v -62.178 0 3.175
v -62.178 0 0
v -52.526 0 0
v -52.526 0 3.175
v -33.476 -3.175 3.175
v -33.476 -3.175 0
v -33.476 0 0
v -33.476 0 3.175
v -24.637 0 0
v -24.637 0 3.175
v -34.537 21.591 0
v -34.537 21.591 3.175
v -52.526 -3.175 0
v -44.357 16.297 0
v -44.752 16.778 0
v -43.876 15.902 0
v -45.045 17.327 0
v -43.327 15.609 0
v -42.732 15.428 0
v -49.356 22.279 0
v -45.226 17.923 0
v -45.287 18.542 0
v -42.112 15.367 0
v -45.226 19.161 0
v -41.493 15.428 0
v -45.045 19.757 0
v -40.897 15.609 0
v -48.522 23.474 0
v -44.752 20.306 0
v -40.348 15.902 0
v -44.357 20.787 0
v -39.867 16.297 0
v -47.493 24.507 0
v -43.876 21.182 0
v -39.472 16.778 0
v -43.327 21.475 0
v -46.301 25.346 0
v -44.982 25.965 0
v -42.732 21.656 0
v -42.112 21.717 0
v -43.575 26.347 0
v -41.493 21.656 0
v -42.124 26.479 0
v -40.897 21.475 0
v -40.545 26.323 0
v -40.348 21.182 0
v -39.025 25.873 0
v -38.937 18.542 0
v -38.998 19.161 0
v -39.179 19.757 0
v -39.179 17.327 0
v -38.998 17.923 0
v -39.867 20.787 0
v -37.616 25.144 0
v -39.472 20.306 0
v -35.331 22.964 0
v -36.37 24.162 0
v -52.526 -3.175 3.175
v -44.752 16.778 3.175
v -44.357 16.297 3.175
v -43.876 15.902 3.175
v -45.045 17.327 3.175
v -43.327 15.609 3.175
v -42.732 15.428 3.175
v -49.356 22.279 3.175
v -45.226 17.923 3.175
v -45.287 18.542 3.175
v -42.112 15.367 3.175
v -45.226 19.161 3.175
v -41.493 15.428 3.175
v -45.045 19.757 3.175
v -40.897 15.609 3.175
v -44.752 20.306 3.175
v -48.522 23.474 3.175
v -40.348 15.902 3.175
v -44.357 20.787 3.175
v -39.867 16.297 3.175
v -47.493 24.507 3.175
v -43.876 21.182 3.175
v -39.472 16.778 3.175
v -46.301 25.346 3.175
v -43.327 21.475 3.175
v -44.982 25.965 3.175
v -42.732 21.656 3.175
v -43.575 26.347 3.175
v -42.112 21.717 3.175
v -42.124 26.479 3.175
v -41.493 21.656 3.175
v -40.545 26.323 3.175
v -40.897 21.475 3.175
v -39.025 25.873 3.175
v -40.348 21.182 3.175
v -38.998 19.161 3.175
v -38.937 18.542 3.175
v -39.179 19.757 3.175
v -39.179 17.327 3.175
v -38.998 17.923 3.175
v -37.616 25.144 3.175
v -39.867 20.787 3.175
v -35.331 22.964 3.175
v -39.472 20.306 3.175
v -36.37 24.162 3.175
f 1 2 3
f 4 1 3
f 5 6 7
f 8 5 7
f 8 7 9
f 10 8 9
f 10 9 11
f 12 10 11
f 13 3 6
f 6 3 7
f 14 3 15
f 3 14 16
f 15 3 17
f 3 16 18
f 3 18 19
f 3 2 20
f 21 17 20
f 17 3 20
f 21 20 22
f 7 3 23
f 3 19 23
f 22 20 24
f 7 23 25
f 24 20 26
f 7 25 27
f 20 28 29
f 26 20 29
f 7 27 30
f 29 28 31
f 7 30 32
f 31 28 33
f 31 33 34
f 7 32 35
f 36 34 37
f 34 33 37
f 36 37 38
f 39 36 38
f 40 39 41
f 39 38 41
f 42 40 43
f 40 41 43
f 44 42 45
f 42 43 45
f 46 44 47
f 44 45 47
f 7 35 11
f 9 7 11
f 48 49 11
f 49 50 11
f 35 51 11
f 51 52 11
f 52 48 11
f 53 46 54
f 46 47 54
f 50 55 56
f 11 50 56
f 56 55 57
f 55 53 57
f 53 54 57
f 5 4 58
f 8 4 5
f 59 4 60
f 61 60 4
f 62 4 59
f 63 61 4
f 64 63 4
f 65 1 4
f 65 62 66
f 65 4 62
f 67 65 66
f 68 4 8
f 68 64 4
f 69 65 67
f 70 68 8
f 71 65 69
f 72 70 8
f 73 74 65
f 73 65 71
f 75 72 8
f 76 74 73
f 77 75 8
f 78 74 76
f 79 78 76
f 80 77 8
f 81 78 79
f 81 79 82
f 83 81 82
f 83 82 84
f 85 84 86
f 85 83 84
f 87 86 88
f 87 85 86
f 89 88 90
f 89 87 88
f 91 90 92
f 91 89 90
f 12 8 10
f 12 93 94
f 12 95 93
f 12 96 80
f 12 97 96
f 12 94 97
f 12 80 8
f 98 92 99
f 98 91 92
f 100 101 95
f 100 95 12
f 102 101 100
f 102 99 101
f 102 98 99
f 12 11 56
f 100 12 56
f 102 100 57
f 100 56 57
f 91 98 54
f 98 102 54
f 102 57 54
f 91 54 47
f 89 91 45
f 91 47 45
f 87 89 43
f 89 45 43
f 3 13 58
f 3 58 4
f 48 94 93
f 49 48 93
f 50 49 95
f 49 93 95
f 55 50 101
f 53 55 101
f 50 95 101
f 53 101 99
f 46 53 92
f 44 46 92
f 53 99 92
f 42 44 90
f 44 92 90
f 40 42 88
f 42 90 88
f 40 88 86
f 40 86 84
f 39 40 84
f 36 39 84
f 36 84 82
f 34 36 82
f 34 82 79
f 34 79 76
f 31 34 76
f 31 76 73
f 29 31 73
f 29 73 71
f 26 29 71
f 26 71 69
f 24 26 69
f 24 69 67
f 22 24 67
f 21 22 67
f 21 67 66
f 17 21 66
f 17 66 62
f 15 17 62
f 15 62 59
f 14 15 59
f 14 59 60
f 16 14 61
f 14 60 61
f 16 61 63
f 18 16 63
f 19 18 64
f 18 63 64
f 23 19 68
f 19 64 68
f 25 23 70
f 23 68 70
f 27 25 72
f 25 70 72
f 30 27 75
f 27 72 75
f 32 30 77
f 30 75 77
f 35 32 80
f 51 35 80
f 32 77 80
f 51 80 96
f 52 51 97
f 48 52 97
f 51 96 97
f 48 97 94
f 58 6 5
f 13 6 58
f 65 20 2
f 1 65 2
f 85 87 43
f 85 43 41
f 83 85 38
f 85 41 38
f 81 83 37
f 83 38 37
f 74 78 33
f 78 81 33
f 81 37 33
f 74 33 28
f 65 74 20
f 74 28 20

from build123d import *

# Parameters (mm, degrees)
SKETCH1_W                   = 62.178178995
SKETCH1_H                   = 55.159619557
BOSS_EXTRUDE1_DEPTH         = 3.175
F_1_4_0_25_DIAMETER_HOLE1_D = 6.35
CUT_EXTRUDE6_DEPTH          = 84.179265432
FILLET1_R                   = 8.382
SKETCH7_W                   = 19.05
SKETCH7_H                   = 3.175
BOSS_EXTRUDE2_DEPTH         = 3.175


with BuildPart() as part:
    # Sketch1 → Boss-Extrude1 (new body)
    with BuildSketch(Plane.XY):
        with Locations((-31.089089498, 27.579809779)):
            Rectangle(SKETCH1_W, SKETCH1_H)
    extrude(amount=BOSS_EXTRUDE1_DEPTH)

    # 1/4 (0.25) Diameter Hole1 (through all)
    with Locations(Plane(origin=(0, 0, 0), x_dir=(-1, 0, 0), z_dir=(0, 0, -1))):
        with Locations((42.112178995, 18.542)):
            Hole(F_1_4_0_25_DIAMETER_HOLE1_D / 2)

    # Sketch4 → Cut-Extrude6 (cut, through all)
    with BuildSketch(Plane(origin=(0, 0, 0), x_dir=(-1, 0, 0), z_dir=(0, 0, -1))):
        Polygon((46.938178995, 26.4795), (62.178178995, 0), (62.178178995, 55.159619557), (0, 55.159619557), (0, 0), (24.636978995, 0), (36.778178995, 26.4795), align=None)
    extrude(amount=-CUT_EXTRUDE6_DEPTH, mode=Mode.SUBTRACT)

    # Fillet1
    # the kernel refuses this fillet: 8.382 mm, written as the material it takes off along each edge
    with BuildSketch(Plane(origin=(-46.938178995, 26.4795, -12.117368839), x_dir=(-0.49882253176769886, -0.8667041489463767, 0), z_dir=(0, 0, 1))) as fillet1_piece_1:
        with BuildLine():
            CenterArc((FILLET1_R * 0.578256685216, FILLET1_R), FILLET1_R, 209.922129856, 60.077870144)
            Line((-FILLET1_R * 0.288447463731, FILLET1_R * 0.501177468232), (0, 0))
            Line((0, 0), (FILLET1_R * 0.578256685216, 0))
        make_face()
    extrude(amount=27.409737677, mode=Mode.SUBTRACT)
    with BuildSketch(Plane(origin=(-36.778178995, 26.4795, -13.444588142), x_dir=(0.41678981361521655, -0.9090028884808855, 0), z_dir=(0, 0, 1))) as fillet1_piece_2:
        with BuildLine():
            CenterArc((FILLET1_R * 0.641593325803, -FILLET1_R), FILLET1_R, 90, 65.367919757)
            Line((-FILLET1_R * 0.267409562678, -FILLET1_R * 0.583210186385), (0, 0))
            Line((0, 0), (FILLET1_R * 0.641593325803, 0))
        make_face()
    extrude(amount=30.064176284, mode=Mode.SUBTRACT)

    # Sketch7 → Boss-Extrude2 (add)
    with BuildSketch(Plane(origin=(0, 0, 0), x_dir=(-1, 0, 0), z_dir=(0, 0, -1))):
        with Locations((43.001178995, -1.5875)):
            Rectangle(SKETCH7_W, SKETCH7_H)
    extrude(amount=-BOSS_EXTRUDE2_DEPTH)


solid = part.part
